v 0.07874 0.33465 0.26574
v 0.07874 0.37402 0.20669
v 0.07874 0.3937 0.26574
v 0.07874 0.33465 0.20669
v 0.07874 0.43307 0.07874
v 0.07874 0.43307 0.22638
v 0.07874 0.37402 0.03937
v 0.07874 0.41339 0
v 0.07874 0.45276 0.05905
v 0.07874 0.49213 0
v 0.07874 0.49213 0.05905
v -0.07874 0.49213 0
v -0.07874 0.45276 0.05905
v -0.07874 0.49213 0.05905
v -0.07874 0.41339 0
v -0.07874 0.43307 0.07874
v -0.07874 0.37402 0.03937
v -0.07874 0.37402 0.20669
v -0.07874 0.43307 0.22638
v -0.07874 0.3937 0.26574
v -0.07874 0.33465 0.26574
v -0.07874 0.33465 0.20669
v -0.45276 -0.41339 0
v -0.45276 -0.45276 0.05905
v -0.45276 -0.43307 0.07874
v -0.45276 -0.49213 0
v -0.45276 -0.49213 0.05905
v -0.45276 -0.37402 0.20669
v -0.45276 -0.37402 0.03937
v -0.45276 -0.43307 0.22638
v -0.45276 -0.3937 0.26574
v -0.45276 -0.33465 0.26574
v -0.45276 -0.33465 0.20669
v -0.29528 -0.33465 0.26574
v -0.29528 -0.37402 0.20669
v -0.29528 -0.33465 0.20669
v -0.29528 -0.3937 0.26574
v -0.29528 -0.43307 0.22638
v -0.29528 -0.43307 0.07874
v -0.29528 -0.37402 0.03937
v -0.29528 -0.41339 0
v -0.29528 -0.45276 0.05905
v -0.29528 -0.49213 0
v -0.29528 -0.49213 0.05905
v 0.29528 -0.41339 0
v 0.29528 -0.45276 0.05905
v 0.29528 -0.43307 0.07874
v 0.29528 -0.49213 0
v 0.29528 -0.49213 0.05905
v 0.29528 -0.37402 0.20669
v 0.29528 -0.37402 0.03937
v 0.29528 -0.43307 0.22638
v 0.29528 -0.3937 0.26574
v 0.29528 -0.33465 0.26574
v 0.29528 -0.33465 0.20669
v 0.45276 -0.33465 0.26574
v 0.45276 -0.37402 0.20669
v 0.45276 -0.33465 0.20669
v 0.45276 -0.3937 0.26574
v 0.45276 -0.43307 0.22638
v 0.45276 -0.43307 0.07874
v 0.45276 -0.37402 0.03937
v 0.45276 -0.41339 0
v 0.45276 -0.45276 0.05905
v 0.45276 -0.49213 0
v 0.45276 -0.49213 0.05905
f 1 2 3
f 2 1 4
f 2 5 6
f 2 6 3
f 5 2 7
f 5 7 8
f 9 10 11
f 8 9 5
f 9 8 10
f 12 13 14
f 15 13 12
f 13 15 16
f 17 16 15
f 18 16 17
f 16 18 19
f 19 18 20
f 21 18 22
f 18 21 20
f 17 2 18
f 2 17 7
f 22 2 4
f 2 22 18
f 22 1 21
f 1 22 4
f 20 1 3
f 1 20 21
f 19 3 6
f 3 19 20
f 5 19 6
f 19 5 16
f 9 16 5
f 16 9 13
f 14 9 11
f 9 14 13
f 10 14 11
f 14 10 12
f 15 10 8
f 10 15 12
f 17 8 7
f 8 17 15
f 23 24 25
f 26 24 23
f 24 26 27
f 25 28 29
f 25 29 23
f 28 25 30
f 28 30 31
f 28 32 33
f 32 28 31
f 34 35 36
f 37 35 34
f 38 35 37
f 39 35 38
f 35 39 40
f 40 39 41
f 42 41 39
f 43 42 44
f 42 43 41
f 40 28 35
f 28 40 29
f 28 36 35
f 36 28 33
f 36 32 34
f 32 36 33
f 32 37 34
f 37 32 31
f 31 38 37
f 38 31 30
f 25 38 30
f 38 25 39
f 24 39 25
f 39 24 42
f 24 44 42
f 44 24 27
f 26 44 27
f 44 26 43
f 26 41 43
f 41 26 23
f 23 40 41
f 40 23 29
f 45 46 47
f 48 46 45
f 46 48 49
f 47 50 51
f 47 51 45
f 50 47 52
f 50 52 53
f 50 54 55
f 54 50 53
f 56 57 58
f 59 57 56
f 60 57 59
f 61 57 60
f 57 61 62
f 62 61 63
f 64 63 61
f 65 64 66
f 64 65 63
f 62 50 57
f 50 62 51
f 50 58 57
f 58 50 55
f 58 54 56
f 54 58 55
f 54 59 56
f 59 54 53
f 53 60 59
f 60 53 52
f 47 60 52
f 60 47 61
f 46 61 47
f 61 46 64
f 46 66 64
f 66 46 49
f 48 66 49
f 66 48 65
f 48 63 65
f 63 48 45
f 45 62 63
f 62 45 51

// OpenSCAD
// file: defines.scad
e = 0.95;    // Шаг выводов
e1 = 1.90;

/*A  = 1.00;  // 0.89..1.45*/
A2 = 1.00; // 0.90..1.30
A1 = 0.10; // 0.00..0.15
A = A1 + A2;
E  = 2.50; // 2.10..3.00
E1 = 1.70; // 1.20..1.80
D  = 3.10; // 2.70..3.10
L  = 0.30; // 0.15..0.60
fi = 20.0; // 0.00..30.00
c  = 0.15; // 0.09..0.26
b  = 0.40; // 0.30..0.51



scale = 1/2.54;
// main file
include <defines.scad>

up = A2 / 2 - c/2 + A1;
dl = 0.05;

module Pin() {
  rotate([90, 0, -90])
  linear_extrude(height = b, center = true)
    polygon([
      [0.0, 0.0],
      [0.0,   c],
      [L-c-dl,   c],
      [L-c,   c+dl],
      [L-c,   up+c-dl*2],
      [L-c+dl*2,   up+c],
      [(E-E1)/2, up+c],
      [(E-E1)/2, up],
      [L,    up],
      [L,   dl*2],
      [L-dl*2,   0.0]
    ]);
}


scale(scale) color("Silver") {
  translate([0, E/2, 0]) Pin();
  translate([-e1/2, -E/2, 0]) rotate([0,0,180]) Pin();
  translate([ e1/2, -E/2, 0]) rotate([0,0,180]) Pin();
}
